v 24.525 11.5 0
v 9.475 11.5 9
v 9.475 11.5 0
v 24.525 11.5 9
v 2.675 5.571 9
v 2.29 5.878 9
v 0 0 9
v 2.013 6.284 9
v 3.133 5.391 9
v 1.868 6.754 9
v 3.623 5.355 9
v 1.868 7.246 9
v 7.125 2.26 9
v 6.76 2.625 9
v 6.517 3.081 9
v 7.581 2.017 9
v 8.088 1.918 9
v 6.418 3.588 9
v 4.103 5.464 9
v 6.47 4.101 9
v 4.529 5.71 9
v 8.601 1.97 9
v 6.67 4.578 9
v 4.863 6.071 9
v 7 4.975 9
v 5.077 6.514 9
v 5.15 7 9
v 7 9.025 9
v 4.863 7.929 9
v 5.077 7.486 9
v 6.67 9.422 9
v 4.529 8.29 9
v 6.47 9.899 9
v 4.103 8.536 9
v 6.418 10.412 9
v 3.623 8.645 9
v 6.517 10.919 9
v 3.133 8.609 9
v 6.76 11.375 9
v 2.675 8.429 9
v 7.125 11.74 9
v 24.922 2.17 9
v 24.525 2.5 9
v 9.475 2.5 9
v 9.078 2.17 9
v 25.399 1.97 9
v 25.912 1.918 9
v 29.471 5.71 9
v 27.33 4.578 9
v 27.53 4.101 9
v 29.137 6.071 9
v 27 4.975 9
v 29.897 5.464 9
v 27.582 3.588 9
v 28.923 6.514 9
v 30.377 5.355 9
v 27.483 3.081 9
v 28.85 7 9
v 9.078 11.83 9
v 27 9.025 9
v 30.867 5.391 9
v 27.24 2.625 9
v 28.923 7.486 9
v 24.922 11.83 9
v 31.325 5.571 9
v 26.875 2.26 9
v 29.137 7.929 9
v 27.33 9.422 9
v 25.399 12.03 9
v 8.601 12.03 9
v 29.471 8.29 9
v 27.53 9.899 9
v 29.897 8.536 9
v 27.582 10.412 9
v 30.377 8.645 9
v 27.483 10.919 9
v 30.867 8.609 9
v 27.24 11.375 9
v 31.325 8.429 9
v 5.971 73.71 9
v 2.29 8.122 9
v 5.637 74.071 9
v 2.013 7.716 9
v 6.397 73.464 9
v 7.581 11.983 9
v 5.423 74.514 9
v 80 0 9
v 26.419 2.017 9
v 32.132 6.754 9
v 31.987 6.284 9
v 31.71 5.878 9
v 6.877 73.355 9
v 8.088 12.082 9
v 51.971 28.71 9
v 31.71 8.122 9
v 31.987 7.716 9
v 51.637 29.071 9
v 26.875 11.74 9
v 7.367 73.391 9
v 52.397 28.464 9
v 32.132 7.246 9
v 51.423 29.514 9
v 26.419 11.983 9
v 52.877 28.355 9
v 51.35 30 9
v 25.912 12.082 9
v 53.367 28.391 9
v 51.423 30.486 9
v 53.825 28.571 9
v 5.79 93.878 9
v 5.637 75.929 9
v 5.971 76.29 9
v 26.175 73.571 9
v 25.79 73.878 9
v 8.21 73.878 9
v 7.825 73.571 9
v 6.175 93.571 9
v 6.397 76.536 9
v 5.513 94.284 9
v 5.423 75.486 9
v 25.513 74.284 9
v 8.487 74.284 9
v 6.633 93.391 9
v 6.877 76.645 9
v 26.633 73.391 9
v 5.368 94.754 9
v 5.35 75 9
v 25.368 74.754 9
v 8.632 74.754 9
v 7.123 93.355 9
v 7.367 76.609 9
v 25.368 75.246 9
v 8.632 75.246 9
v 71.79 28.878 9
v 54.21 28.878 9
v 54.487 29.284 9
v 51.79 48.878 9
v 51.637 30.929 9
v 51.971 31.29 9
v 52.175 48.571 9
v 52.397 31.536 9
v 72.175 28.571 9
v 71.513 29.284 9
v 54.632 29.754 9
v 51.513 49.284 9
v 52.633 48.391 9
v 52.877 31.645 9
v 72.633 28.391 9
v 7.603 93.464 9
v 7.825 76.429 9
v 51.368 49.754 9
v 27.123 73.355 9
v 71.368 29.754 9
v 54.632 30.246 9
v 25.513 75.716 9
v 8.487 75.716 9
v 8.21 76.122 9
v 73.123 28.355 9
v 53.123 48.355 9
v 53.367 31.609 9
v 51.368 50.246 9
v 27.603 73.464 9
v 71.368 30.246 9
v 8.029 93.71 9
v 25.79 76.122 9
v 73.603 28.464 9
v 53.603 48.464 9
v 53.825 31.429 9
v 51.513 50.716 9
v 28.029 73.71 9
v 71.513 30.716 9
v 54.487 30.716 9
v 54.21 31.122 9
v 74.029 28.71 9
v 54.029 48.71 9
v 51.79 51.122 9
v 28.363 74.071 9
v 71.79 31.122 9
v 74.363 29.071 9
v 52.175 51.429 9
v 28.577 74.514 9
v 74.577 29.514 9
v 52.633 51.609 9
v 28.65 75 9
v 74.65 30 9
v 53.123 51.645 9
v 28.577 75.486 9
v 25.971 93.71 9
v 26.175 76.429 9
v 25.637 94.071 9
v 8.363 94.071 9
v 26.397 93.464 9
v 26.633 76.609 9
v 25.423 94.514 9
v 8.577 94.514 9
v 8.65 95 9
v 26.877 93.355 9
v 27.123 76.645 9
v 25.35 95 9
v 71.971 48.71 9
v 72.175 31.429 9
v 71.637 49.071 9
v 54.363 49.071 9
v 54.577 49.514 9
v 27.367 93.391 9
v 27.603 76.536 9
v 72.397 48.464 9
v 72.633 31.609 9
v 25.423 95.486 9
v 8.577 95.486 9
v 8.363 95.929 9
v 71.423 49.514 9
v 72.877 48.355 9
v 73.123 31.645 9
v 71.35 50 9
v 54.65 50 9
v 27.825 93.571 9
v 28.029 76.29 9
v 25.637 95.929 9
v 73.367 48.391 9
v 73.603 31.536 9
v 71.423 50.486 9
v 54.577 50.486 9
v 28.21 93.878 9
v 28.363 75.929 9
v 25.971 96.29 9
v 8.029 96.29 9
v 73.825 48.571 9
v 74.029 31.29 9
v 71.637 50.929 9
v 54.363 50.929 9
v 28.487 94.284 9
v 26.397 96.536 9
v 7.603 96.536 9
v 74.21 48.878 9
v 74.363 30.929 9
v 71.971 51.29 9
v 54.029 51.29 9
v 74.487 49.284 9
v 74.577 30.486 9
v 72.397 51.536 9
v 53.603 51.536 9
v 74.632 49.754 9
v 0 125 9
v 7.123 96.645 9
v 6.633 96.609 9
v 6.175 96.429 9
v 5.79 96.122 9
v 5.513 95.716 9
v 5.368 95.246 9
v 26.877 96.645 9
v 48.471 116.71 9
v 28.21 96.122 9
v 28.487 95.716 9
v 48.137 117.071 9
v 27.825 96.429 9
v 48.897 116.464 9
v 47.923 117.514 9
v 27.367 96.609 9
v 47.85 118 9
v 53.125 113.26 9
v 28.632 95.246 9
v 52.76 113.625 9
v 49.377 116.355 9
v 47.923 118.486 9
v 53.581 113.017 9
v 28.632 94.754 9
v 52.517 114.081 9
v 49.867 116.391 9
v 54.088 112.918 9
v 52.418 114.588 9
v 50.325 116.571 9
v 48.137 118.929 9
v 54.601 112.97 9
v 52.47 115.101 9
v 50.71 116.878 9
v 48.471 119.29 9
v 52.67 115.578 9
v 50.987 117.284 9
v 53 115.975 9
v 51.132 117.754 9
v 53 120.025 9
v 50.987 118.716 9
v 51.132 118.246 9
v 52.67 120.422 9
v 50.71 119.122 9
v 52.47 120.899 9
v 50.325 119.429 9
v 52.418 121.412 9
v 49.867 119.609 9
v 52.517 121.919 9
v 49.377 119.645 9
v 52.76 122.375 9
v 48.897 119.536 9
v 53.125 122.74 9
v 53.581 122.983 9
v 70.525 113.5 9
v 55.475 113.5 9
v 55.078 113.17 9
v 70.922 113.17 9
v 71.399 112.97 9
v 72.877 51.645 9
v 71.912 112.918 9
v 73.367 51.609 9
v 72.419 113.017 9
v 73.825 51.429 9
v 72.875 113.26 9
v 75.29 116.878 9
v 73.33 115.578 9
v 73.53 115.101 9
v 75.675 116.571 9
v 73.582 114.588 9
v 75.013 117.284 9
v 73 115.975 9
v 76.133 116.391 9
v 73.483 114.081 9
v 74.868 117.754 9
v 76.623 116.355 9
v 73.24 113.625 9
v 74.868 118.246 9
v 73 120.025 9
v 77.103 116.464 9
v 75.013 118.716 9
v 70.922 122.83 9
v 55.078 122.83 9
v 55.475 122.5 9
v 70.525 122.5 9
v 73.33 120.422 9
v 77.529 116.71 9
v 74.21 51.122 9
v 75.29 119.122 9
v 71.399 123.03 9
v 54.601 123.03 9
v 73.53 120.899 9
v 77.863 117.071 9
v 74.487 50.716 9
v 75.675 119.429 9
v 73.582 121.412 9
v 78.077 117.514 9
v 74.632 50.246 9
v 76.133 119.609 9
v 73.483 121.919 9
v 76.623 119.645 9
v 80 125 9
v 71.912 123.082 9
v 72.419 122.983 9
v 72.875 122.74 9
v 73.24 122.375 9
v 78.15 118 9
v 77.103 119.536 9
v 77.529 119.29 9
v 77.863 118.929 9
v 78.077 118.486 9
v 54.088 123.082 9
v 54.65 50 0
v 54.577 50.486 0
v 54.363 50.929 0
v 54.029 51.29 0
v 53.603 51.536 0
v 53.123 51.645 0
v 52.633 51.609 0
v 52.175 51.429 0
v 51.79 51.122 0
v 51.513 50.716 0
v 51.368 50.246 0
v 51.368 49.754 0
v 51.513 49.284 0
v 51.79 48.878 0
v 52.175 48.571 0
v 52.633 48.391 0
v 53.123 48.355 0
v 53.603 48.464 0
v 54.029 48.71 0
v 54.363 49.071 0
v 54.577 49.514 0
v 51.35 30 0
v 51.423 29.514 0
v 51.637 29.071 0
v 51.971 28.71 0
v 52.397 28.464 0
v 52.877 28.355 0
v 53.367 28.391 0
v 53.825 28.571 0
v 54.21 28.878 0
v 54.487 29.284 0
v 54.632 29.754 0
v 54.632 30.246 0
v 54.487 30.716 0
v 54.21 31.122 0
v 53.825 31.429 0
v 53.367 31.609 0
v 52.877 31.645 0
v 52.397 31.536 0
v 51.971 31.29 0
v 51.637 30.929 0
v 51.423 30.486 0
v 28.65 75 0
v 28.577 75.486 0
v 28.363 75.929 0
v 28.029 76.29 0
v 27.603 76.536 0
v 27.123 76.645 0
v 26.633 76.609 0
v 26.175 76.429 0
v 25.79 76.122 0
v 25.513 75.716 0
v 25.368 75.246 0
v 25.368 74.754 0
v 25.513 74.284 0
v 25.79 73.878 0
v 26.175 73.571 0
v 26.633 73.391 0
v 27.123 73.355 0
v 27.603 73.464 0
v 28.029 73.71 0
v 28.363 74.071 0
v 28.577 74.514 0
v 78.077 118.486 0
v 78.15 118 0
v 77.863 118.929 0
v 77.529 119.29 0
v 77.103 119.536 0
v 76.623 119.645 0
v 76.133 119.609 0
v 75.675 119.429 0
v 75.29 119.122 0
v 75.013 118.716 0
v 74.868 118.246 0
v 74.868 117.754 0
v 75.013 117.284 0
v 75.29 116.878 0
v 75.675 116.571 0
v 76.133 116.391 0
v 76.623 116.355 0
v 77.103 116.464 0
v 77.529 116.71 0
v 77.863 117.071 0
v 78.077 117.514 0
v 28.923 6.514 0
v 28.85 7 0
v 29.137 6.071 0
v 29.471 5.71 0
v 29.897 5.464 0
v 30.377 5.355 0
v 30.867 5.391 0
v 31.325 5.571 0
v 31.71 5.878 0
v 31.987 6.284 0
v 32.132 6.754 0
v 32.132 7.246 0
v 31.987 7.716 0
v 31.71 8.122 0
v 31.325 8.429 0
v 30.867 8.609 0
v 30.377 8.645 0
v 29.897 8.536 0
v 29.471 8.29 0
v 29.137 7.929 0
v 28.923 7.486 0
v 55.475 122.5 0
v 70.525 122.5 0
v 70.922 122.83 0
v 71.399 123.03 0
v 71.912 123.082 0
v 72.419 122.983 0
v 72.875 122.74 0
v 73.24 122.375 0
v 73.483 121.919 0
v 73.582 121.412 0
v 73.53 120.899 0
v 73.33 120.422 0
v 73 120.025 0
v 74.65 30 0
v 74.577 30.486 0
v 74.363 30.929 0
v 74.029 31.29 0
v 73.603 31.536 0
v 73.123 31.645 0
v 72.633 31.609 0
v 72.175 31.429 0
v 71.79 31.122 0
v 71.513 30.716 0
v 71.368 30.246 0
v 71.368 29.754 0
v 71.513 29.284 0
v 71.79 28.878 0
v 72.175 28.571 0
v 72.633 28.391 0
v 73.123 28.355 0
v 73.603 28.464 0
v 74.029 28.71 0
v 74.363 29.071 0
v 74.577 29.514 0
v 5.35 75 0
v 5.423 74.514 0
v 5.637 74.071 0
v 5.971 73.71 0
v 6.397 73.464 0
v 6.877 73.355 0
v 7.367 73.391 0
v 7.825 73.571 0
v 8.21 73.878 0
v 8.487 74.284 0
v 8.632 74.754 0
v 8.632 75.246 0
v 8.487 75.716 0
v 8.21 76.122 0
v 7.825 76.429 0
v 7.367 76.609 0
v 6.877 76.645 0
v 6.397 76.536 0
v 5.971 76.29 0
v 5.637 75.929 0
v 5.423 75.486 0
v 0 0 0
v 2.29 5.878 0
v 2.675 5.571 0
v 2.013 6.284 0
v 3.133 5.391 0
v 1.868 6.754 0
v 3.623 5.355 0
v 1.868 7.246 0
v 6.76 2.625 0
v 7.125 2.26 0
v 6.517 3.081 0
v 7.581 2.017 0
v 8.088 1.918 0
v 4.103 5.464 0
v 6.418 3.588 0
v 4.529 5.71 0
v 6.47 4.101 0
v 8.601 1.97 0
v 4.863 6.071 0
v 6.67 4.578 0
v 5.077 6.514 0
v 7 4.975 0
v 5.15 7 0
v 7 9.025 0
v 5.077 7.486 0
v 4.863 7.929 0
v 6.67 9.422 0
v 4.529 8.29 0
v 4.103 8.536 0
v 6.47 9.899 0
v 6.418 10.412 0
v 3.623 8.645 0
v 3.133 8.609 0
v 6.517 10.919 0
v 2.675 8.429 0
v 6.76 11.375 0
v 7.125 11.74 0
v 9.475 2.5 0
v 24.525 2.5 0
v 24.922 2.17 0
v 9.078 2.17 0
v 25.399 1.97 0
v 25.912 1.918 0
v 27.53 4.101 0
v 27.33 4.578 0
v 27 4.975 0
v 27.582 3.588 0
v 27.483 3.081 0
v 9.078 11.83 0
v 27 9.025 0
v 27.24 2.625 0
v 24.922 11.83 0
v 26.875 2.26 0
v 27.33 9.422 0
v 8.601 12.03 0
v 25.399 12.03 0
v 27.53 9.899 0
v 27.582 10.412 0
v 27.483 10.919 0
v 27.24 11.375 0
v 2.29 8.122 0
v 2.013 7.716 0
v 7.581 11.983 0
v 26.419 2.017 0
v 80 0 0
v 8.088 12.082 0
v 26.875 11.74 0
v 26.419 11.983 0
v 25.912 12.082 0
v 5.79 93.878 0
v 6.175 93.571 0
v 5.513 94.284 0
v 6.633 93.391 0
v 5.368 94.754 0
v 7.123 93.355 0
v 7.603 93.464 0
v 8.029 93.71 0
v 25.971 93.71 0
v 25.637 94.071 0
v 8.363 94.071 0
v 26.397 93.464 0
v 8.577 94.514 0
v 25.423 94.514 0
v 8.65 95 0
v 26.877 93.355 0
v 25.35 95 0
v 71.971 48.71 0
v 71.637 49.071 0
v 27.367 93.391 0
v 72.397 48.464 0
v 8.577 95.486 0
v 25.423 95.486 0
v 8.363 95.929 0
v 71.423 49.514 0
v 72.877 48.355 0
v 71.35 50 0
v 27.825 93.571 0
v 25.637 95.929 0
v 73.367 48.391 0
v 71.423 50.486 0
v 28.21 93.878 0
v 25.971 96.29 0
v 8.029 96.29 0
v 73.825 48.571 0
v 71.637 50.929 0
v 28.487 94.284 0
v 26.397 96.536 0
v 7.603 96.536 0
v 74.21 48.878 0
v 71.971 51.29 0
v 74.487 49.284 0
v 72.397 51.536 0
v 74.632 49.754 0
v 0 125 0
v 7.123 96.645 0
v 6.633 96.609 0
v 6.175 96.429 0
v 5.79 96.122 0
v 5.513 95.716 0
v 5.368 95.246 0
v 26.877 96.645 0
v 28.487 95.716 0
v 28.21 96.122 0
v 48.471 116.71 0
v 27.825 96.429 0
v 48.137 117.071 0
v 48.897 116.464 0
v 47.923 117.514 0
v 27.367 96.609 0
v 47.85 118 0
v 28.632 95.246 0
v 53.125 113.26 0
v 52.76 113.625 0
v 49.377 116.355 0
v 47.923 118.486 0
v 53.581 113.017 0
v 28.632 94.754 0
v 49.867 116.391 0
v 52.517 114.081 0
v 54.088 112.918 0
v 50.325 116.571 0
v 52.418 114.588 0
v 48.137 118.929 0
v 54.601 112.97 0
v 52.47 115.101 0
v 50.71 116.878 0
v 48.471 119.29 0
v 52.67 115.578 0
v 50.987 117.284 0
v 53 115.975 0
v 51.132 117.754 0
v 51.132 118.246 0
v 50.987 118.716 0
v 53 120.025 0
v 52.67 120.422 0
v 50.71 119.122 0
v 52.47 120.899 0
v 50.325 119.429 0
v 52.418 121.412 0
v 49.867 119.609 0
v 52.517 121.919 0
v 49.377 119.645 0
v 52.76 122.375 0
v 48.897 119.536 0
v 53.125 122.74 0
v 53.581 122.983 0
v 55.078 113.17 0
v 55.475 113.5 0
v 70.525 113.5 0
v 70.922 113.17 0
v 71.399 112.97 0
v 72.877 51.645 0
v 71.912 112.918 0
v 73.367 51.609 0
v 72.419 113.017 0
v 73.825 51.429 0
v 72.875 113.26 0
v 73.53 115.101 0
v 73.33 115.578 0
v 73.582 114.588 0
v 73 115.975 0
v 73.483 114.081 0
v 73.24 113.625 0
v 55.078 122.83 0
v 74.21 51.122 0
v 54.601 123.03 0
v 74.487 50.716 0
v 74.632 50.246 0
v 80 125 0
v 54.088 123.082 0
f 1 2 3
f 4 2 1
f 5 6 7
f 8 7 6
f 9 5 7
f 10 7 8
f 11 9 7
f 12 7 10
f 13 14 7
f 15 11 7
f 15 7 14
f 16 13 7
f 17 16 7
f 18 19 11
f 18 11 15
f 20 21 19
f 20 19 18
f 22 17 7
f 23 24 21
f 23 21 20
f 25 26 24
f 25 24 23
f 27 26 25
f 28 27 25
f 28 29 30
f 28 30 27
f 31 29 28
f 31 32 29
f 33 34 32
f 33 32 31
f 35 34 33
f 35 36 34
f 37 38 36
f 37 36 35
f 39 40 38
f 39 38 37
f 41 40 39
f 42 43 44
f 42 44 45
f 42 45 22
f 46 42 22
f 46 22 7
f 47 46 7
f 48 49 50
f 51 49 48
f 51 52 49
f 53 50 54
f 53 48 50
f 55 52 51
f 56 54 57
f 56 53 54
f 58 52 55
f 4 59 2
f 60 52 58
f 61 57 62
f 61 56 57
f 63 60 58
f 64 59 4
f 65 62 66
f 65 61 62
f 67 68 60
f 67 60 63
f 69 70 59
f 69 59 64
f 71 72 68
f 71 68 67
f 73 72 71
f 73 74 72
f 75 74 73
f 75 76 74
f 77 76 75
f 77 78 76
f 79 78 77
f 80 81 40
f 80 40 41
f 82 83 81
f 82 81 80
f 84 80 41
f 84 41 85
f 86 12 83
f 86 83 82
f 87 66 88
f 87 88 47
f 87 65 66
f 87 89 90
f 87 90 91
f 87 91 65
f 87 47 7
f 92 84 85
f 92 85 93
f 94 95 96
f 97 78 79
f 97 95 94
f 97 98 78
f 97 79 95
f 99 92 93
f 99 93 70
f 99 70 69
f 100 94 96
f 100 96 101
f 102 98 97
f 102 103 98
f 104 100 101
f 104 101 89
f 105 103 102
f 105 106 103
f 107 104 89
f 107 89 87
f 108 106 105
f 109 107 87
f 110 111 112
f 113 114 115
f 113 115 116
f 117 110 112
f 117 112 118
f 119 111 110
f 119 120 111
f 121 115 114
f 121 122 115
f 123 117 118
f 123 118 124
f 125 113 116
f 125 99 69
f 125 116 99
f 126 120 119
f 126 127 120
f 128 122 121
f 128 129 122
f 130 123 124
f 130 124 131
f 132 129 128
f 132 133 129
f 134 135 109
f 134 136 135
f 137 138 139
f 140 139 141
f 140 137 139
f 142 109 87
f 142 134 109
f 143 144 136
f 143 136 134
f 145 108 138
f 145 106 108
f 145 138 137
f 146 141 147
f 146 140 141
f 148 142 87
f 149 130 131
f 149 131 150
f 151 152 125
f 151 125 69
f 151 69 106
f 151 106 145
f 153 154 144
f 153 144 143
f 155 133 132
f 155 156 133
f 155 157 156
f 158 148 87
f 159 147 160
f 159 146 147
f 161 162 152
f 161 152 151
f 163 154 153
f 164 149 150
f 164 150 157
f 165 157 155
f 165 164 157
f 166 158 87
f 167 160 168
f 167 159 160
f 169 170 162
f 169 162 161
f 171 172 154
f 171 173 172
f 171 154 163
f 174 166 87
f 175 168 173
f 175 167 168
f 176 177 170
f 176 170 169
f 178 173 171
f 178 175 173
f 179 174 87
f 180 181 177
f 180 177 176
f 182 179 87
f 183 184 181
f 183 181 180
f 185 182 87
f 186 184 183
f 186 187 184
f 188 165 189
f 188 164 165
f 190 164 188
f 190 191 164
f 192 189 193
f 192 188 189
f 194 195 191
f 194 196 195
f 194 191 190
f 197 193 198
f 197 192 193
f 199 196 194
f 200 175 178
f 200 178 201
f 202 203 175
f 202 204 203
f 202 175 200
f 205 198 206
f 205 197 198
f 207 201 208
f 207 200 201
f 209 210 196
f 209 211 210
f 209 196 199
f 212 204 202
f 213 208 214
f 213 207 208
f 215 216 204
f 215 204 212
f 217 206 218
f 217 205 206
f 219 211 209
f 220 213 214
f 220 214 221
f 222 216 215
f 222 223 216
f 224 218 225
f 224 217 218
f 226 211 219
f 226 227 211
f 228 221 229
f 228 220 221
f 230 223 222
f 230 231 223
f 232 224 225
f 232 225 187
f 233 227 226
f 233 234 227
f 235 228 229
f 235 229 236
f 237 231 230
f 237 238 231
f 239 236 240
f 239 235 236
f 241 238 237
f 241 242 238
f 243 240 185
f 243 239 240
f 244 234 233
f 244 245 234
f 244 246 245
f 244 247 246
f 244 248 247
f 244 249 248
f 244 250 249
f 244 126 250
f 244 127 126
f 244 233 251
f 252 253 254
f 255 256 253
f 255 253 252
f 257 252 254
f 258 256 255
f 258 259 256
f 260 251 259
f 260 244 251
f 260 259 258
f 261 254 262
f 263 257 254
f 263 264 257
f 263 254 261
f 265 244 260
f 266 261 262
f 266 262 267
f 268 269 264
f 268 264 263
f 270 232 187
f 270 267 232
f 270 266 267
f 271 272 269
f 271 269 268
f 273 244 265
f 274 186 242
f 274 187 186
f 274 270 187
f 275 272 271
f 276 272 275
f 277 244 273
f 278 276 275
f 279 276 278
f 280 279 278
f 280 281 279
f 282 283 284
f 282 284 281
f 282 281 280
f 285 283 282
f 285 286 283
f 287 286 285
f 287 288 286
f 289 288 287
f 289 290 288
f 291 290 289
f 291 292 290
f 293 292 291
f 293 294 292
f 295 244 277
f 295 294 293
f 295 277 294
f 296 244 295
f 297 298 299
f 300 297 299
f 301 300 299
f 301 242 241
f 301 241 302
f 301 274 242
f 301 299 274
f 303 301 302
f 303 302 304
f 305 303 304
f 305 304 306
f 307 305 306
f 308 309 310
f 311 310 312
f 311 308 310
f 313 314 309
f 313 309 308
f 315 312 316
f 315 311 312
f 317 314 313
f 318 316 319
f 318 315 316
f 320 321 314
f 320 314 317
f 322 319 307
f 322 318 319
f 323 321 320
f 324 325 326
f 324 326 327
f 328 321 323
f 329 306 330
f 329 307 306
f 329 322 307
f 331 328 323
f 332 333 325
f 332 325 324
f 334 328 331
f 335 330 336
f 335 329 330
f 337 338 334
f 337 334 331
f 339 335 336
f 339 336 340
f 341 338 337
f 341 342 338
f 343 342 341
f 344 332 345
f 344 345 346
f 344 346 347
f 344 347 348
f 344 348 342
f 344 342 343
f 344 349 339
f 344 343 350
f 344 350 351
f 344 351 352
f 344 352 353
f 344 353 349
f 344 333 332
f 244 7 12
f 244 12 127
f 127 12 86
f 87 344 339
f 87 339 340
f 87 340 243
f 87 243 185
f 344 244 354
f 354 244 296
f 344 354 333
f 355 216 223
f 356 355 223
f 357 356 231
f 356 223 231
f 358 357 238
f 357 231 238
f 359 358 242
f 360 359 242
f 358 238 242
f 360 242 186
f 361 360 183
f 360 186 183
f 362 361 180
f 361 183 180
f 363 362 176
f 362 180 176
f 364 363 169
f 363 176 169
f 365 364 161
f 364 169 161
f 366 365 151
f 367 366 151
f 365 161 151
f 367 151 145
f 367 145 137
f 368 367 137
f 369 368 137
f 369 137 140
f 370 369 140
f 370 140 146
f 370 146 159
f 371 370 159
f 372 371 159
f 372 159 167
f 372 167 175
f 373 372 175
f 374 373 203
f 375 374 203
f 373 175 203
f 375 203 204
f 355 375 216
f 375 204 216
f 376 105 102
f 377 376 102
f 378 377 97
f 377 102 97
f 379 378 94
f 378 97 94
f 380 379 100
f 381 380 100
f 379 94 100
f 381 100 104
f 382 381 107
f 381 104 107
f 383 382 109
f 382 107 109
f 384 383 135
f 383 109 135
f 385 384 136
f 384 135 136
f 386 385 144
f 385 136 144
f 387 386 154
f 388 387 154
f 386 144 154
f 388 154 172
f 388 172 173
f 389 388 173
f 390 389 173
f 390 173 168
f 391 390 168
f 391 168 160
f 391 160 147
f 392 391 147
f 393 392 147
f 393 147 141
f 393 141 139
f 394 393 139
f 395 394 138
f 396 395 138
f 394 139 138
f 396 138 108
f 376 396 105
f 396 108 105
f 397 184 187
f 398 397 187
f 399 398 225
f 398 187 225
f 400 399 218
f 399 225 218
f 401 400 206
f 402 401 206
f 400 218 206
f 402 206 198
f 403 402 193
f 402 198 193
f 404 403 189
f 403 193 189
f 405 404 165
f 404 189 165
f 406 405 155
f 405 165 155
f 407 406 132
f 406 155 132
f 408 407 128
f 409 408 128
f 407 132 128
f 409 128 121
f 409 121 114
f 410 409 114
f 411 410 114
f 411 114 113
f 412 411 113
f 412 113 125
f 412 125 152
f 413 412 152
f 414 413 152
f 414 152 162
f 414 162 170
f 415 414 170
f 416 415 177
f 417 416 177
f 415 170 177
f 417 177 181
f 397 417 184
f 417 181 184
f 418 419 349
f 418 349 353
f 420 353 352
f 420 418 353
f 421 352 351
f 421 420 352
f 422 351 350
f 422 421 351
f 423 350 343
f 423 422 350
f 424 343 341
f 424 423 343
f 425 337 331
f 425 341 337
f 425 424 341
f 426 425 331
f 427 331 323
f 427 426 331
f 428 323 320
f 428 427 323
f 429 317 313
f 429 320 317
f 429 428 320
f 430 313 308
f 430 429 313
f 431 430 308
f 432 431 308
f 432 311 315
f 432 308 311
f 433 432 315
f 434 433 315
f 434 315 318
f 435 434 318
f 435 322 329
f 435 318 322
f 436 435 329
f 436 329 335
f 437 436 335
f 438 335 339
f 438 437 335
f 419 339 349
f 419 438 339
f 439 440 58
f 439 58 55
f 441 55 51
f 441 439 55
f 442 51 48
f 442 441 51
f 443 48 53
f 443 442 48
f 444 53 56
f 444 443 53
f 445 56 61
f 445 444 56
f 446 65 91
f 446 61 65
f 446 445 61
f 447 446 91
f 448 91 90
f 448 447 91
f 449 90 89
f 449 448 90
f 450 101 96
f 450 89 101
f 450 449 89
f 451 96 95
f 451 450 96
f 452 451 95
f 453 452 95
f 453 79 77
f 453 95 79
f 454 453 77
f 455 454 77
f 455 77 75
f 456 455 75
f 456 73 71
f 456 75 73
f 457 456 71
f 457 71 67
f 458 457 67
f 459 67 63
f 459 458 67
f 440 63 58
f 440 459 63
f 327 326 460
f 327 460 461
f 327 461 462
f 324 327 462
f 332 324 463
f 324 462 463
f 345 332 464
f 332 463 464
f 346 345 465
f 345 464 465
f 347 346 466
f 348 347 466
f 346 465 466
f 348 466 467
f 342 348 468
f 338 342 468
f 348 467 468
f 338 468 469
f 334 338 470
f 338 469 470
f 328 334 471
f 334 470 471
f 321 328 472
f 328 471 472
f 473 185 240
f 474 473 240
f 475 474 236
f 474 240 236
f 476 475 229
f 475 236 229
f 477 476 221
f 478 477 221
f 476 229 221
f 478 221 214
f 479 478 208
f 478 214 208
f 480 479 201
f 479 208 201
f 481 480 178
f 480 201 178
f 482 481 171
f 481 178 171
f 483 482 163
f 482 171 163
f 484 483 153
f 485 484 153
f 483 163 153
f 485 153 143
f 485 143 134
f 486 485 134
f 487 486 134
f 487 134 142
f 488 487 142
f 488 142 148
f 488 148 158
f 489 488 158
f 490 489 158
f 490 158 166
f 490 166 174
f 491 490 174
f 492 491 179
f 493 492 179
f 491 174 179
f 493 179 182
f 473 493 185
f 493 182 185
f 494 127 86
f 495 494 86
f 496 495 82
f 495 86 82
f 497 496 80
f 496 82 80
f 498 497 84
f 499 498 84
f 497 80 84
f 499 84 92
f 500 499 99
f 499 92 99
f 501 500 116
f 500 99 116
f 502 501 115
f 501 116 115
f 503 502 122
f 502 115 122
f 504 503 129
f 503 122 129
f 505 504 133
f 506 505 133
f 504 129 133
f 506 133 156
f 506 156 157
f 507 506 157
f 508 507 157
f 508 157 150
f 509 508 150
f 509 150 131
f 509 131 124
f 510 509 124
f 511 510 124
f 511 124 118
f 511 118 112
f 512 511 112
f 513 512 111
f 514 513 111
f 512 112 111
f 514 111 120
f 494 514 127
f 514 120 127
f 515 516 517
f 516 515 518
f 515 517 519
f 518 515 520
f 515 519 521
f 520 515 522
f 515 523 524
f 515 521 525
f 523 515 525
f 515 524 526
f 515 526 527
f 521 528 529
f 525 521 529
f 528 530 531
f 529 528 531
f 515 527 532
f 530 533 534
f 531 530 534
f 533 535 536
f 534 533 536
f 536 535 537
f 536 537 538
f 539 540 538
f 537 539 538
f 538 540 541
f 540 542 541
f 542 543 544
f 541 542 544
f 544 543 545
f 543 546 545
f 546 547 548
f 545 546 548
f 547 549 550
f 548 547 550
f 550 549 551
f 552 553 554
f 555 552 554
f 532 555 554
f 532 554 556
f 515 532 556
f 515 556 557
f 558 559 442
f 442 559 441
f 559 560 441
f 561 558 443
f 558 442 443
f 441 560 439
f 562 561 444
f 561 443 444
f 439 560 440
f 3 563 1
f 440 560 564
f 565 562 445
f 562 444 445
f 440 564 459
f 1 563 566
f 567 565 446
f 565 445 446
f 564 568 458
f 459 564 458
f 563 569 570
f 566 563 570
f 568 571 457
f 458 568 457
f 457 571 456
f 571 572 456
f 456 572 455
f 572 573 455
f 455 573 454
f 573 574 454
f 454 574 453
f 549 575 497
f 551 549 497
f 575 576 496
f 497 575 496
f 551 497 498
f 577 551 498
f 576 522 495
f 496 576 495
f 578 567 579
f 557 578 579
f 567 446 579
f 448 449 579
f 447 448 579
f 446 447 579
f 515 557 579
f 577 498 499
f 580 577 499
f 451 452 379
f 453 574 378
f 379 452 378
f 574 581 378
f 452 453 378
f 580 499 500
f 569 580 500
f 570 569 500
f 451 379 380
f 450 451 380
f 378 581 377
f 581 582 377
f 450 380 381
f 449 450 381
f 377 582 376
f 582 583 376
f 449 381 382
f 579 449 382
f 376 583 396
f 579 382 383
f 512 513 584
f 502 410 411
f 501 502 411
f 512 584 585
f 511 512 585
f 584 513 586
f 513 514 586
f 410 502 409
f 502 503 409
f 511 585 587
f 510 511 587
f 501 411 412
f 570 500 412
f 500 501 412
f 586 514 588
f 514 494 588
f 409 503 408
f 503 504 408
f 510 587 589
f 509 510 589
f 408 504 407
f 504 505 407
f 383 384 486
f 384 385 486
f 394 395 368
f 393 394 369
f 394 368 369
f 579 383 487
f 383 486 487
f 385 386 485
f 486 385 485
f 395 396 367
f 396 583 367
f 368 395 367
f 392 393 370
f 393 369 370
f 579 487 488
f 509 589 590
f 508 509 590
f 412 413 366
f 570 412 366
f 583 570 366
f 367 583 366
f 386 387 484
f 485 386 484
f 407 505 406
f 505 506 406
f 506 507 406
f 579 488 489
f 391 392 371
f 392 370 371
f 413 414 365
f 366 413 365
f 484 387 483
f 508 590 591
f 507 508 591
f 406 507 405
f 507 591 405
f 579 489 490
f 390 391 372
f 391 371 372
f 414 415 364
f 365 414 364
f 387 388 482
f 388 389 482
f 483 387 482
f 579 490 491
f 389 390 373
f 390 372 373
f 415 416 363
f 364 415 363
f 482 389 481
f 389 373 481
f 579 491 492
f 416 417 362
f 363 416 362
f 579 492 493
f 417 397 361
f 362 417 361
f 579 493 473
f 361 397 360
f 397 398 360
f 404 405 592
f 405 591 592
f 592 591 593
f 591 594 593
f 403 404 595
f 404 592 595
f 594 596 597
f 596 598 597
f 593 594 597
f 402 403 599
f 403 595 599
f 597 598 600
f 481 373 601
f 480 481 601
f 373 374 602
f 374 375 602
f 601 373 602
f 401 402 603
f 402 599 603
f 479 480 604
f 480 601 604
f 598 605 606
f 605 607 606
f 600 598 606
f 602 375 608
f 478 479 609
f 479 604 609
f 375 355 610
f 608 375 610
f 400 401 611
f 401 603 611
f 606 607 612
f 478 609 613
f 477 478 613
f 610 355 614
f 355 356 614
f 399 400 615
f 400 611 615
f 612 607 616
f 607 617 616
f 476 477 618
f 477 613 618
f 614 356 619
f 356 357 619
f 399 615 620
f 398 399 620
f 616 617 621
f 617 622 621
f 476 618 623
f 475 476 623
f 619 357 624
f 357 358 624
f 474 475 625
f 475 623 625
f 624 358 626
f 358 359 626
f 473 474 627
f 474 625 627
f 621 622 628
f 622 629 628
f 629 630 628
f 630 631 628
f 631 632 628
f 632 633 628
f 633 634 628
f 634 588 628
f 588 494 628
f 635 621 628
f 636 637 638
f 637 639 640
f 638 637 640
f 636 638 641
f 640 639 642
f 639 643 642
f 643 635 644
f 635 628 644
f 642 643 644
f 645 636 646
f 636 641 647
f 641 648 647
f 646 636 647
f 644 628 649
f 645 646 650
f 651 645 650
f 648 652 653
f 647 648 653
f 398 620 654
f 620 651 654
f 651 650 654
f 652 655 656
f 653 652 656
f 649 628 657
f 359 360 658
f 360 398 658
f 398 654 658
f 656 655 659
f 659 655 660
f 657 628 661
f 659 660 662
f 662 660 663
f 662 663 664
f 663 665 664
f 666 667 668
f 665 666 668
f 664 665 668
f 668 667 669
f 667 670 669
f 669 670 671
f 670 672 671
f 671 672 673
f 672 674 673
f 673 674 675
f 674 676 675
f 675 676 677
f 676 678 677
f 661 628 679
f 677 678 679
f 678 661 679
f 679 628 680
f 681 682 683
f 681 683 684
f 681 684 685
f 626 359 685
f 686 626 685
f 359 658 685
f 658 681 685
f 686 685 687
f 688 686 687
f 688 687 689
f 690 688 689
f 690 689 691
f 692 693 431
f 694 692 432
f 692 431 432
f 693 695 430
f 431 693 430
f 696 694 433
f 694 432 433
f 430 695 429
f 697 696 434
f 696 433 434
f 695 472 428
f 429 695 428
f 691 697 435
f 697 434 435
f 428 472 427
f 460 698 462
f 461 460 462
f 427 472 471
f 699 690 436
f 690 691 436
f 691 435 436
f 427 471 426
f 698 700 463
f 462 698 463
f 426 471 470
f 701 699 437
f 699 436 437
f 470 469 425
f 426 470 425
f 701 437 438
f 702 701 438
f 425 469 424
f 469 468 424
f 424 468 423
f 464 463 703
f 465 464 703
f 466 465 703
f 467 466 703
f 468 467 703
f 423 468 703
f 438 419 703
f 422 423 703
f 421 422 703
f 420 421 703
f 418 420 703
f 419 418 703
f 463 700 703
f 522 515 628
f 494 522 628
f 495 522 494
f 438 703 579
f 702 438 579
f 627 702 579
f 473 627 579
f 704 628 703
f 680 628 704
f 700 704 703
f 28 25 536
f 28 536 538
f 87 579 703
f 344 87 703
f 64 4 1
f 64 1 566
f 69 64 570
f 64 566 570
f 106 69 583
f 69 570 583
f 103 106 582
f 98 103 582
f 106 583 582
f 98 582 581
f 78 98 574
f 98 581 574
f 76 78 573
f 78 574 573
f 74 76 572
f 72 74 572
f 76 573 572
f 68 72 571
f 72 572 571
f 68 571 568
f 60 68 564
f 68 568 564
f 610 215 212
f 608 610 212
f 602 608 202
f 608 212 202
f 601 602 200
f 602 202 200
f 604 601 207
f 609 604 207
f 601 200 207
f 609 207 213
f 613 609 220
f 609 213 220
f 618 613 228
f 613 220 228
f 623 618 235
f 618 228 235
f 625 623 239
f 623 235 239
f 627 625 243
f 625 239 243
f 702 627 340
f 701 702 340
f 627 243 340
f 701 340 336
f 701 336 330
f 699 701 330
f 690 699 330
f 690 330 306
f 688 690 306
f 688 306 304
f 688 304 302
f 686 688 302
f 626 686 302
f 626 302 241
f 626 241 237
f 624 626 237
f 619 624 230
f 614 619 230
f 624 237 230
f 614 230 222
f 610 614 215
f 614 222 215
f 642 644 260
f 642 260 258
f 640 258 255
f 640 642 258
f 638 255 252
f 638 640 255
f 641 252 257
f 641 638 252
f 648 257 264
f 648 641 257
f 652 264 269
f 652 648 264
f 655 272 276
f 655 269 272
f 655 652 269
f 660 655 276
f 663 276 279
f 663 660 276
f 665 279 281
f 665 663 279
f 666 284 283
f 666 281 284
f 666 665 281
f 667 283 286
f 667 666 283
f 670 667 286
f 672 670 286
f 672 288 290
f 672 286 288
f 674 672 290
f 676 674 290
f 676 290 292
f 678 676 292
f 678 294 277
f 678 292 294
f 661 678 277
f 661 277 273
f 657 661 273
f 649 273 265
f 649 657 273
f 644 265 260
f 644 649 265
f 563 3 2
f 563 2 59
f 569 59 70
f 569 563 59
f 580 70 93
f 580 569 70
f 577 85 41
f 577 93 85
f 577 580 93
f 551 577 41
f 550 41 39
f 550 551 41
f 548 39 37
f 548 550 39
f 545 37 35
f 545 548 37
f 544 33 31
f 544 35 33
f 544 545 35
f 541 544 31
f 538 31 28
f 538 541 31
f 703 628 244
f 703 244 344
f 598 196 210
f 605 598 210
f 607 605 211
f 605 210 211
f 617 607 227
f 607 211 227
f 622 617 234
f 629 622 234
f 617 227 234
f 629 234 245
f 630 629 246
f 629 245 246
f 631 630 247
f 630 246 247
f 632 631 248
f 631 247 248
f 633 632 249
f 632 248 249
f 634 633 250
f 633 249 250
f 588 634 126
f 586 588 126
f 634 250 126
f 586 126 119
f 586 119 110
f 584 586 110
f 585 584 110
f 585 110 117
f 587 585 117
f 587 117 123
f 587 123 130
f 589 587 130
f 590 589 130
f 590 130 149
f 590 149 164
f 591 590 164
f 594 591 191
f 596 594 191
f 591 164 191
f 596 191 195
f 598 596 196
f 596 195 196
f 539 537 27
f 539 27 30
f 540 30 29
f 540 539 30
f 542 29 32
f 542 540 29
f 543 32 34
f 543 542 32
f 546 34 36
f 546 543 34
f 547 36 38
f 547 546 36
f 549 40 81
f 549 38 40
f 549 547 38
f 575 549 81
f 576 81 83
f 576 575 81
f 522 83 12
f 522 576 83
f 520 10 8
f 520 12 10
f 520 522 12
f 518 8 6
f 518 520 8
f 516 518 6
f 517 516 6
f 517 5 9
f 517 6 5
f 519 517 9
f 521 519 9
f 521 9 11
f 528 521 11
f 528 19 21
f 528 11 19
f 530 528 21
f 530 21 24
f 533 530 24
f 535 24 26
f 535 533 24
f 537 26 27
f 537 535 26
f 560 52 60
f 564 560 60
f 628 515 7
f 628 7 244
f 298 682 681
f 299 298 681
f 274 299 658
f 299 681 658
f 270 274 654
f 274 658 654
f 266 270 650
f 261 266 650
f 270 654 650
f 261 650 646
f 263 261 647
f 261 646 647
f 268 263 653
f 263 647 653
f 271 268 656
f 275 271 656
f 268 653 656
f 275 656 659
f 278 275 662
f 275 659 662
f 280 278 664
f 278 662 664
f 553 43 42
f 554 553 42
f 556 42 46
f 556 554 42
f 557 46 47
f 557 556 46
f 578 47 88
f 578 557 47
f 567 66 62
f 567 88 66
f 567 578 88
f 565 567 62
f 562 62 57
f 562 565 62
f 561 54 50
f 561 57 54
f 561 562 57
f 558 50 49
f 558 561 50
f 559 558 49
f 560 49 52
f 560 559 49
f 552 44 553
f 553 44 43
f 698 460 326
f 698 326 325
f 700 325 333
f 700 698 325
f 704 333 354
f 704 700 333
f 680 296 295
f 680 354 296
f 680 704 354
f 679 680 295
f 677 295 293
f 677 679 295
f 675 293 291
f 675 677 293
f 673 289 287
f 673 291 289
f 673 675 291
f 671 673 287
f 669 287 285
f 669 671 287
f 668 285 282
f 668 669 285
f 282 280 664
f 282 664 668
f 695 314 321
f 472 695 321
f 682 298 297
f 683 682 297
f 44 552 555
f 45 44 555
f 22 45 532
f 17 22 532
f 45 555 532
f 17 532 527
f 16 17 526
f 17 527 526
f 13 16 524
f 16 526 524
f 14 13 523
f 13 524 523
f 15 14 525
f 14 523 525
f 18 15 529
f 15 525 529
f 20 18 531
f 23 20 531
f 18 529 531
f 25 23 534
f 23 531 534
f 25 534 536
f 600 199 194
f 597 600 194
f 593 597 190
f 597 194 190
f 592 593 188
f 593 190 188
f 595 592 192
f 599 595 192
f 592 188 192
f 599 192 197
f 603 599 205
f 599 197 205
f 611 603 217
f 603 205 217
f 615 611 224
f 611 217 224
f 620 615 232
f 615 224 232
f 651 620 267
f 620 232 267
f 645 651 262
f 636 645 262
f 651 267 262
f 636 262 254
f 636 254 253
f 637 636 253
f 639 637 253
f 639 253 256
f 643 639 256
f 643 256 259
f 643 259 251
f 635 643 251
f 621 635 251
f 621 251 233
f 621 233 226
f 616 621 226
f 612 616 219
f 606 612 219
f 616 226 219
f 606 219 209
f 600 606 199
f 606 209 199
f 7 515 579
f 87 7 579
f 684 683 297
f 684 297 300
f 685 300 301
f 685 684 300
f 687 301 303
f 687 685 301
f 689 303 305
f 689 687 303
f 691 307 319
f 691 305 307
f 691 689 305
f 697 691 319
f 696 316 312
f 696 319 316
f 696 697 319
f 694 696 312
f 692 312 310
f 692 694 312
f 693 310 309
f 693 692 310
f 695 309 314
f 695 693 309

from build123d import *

# Parameters (mm, degrees)
ESQUISSE1_W                  = 80
ESQUISSE1_H                  = 125
BOSS_EXTRU_1_DEPTH           = 9
ESQUISSE2_W                  = 20
ESQUISSE2_H                  = 9
ENL_V_MAT_EXTRU_1_DEPTH      = 9
ENL_V_MAT_EXTRU_2_DEPTH      = 149.680866287
ENL_V_MAT_EXTRU_2_DEPTH_BACK = 149.680866287
ESQUISSE3_R                  = 1.65
ESQUISSE4_R                  = 1.65
ENL_V_MAT_EXTRU_3_DEPTH      = 9


with BuildPart() as part:
    # Esquisse1 → Boss.-Extru.1 (new body)
    with BuildSketch(Plane.XY):
        with Locations((40, 62.5)):
            Rectangle(ESQUISSE1_W, ESQUISSE1_H)
    extrude(amount=BOSS_EXTRU_1_DEPTH)

    # Esquisse2 → Enlèv. mat.-Extru.1 (cut)
    with BuildSketch(Plane.XY.offset(9)):
        with Locations((17, 7)):
            Rectangle(ESQUISSE2_W, ESQUISSE2_H)
        with Locations((63, 118)):
            Rectangle(ESQUISSE2_W, ESQUISSE2_H)
    extrude(amount=-ENL_V_MAT_EXTRU_1_DEPTH, mode=Mode.SUBTRACT)

    # Esquisse3 → Enlèv. mat.-Extru.2 (cut, two sides: drawn at the far end of the back side and taken through both)
    with BuildSketch(Plane.XY.offset(9).offset(-ENL_V_MAT_EXTRU_2_DEPTH_BACK)):
        with Locations((3.5, 7)):
            Circle(ESQUISSE3_R)
        with Locations(Location((30.5, 7, 0), (0, 0, 180))):
            Circle(ESQUISSE3_R)
        with Locations(Location((49.5, 118, 0), (0, 0, 180))):
            Circle(ESQUISSE3_R)
        with Locations((76.5, 118)):
            Circle(ESQUISSE3_R)
        with BuildLine():
            Line((7, 9.025126266), (9.474873734, 11.5))
            ThreePointArc((9.474873734, 11.5), (6.929289322, 11.570710678), (7, 9.025126266))
        make_face()
        with BuildLine():
            Line((27, 9.025126266), (24.525126266, 11.5))
            ThreePointArc((24.525126266, 11.5), (27.070710678, 11.570710678), (27, 9.025126266))
        make_face()
        with BuildLine():
            Line((27, 4.974873734), (24.525126266, 2.5))
            ThreePointArc((24.525126266, 2.5), (27.070710678, 2.429289322), (27, 4.974873734))
        make_face()
        with BuildLine():
            Line((7, 4.974873734), (9.474873734, 2.5))
            ThreePointArc((9.474873734, 2.5), (6.929289322, 2.429289322), (7, 4.974873734))
        make_face()
        with BuildLine():
            Line((73, 115.974873734), (70.525126266, 113.5))
            ThreePointArc((70.525126266, 113.5), (73.070710678, 113.429289322), (73, 115.974873734))
        make_face()
        with BuildLine():
            Line((53, 115.974873734), (55.474873734, 113.5))
            ThreePointArc((55.474873734, 113.5), (52.929289322, 113.429289322), (53, 115.974873734))
        make_face()
        with BuildLine():
            Line((53, 120.025126266), (55.474873734, 122.5))
            ThreePointArc((55.474873734, 122.5), (52.929289322, 122.570710678), (53, 120.025126266))
        make_face()
        with BuildLine():
            Line((73, 120.025126266), (70.525126266, 122.5))
            ThreePointArc((70.525126266, 122.5), (73.070710678, 122.570710678), (73, 120.025126266))
        make_face()
    extrude(amount=ENL_V_MAT_EXTRU_2_DEPTH + ENL_V_MAT_EXTRU_2_DEPTH_BACK, mode=Mode.SUBTRACT)

    # Esquisse4 → Enlèv. mat.-Extru.3 (cut)
    with BuildSketch(Plane.XY.offset(9)):
        with Locations((7, 95)):
            Circle(ESQUISSE4_R)
        with Locations(Location((27, 95, 0), (0, 0, 180))):
            Circle(ESQUISSE4_R)
        with Locations((27, 75)):
            Circle(ESQUISSE4_R)
        with Locations(Location((7, 75, 0), (0, 0, 180))):
            Circle(ESQUISSE4_R)
        with Locations((73, 30)):
            Circle(ESQUISSE4_R)
        with Locations(Location((53, 30, 0), (0, 0, 180))):
            Circle(ESQUISSE4_R)
        with Locations((53, 50)):
            Circle(ESQUISSE4_R)
        with Locations(Location((73, 50, 0), (0, 0, 180))):
            Circle(ESQUISSE4_R)
    extrude(amount=-ENL_V_MAT_EXTRU_3_DEPTH, mode=Mode.SUBTRACT)


solid = part.part
